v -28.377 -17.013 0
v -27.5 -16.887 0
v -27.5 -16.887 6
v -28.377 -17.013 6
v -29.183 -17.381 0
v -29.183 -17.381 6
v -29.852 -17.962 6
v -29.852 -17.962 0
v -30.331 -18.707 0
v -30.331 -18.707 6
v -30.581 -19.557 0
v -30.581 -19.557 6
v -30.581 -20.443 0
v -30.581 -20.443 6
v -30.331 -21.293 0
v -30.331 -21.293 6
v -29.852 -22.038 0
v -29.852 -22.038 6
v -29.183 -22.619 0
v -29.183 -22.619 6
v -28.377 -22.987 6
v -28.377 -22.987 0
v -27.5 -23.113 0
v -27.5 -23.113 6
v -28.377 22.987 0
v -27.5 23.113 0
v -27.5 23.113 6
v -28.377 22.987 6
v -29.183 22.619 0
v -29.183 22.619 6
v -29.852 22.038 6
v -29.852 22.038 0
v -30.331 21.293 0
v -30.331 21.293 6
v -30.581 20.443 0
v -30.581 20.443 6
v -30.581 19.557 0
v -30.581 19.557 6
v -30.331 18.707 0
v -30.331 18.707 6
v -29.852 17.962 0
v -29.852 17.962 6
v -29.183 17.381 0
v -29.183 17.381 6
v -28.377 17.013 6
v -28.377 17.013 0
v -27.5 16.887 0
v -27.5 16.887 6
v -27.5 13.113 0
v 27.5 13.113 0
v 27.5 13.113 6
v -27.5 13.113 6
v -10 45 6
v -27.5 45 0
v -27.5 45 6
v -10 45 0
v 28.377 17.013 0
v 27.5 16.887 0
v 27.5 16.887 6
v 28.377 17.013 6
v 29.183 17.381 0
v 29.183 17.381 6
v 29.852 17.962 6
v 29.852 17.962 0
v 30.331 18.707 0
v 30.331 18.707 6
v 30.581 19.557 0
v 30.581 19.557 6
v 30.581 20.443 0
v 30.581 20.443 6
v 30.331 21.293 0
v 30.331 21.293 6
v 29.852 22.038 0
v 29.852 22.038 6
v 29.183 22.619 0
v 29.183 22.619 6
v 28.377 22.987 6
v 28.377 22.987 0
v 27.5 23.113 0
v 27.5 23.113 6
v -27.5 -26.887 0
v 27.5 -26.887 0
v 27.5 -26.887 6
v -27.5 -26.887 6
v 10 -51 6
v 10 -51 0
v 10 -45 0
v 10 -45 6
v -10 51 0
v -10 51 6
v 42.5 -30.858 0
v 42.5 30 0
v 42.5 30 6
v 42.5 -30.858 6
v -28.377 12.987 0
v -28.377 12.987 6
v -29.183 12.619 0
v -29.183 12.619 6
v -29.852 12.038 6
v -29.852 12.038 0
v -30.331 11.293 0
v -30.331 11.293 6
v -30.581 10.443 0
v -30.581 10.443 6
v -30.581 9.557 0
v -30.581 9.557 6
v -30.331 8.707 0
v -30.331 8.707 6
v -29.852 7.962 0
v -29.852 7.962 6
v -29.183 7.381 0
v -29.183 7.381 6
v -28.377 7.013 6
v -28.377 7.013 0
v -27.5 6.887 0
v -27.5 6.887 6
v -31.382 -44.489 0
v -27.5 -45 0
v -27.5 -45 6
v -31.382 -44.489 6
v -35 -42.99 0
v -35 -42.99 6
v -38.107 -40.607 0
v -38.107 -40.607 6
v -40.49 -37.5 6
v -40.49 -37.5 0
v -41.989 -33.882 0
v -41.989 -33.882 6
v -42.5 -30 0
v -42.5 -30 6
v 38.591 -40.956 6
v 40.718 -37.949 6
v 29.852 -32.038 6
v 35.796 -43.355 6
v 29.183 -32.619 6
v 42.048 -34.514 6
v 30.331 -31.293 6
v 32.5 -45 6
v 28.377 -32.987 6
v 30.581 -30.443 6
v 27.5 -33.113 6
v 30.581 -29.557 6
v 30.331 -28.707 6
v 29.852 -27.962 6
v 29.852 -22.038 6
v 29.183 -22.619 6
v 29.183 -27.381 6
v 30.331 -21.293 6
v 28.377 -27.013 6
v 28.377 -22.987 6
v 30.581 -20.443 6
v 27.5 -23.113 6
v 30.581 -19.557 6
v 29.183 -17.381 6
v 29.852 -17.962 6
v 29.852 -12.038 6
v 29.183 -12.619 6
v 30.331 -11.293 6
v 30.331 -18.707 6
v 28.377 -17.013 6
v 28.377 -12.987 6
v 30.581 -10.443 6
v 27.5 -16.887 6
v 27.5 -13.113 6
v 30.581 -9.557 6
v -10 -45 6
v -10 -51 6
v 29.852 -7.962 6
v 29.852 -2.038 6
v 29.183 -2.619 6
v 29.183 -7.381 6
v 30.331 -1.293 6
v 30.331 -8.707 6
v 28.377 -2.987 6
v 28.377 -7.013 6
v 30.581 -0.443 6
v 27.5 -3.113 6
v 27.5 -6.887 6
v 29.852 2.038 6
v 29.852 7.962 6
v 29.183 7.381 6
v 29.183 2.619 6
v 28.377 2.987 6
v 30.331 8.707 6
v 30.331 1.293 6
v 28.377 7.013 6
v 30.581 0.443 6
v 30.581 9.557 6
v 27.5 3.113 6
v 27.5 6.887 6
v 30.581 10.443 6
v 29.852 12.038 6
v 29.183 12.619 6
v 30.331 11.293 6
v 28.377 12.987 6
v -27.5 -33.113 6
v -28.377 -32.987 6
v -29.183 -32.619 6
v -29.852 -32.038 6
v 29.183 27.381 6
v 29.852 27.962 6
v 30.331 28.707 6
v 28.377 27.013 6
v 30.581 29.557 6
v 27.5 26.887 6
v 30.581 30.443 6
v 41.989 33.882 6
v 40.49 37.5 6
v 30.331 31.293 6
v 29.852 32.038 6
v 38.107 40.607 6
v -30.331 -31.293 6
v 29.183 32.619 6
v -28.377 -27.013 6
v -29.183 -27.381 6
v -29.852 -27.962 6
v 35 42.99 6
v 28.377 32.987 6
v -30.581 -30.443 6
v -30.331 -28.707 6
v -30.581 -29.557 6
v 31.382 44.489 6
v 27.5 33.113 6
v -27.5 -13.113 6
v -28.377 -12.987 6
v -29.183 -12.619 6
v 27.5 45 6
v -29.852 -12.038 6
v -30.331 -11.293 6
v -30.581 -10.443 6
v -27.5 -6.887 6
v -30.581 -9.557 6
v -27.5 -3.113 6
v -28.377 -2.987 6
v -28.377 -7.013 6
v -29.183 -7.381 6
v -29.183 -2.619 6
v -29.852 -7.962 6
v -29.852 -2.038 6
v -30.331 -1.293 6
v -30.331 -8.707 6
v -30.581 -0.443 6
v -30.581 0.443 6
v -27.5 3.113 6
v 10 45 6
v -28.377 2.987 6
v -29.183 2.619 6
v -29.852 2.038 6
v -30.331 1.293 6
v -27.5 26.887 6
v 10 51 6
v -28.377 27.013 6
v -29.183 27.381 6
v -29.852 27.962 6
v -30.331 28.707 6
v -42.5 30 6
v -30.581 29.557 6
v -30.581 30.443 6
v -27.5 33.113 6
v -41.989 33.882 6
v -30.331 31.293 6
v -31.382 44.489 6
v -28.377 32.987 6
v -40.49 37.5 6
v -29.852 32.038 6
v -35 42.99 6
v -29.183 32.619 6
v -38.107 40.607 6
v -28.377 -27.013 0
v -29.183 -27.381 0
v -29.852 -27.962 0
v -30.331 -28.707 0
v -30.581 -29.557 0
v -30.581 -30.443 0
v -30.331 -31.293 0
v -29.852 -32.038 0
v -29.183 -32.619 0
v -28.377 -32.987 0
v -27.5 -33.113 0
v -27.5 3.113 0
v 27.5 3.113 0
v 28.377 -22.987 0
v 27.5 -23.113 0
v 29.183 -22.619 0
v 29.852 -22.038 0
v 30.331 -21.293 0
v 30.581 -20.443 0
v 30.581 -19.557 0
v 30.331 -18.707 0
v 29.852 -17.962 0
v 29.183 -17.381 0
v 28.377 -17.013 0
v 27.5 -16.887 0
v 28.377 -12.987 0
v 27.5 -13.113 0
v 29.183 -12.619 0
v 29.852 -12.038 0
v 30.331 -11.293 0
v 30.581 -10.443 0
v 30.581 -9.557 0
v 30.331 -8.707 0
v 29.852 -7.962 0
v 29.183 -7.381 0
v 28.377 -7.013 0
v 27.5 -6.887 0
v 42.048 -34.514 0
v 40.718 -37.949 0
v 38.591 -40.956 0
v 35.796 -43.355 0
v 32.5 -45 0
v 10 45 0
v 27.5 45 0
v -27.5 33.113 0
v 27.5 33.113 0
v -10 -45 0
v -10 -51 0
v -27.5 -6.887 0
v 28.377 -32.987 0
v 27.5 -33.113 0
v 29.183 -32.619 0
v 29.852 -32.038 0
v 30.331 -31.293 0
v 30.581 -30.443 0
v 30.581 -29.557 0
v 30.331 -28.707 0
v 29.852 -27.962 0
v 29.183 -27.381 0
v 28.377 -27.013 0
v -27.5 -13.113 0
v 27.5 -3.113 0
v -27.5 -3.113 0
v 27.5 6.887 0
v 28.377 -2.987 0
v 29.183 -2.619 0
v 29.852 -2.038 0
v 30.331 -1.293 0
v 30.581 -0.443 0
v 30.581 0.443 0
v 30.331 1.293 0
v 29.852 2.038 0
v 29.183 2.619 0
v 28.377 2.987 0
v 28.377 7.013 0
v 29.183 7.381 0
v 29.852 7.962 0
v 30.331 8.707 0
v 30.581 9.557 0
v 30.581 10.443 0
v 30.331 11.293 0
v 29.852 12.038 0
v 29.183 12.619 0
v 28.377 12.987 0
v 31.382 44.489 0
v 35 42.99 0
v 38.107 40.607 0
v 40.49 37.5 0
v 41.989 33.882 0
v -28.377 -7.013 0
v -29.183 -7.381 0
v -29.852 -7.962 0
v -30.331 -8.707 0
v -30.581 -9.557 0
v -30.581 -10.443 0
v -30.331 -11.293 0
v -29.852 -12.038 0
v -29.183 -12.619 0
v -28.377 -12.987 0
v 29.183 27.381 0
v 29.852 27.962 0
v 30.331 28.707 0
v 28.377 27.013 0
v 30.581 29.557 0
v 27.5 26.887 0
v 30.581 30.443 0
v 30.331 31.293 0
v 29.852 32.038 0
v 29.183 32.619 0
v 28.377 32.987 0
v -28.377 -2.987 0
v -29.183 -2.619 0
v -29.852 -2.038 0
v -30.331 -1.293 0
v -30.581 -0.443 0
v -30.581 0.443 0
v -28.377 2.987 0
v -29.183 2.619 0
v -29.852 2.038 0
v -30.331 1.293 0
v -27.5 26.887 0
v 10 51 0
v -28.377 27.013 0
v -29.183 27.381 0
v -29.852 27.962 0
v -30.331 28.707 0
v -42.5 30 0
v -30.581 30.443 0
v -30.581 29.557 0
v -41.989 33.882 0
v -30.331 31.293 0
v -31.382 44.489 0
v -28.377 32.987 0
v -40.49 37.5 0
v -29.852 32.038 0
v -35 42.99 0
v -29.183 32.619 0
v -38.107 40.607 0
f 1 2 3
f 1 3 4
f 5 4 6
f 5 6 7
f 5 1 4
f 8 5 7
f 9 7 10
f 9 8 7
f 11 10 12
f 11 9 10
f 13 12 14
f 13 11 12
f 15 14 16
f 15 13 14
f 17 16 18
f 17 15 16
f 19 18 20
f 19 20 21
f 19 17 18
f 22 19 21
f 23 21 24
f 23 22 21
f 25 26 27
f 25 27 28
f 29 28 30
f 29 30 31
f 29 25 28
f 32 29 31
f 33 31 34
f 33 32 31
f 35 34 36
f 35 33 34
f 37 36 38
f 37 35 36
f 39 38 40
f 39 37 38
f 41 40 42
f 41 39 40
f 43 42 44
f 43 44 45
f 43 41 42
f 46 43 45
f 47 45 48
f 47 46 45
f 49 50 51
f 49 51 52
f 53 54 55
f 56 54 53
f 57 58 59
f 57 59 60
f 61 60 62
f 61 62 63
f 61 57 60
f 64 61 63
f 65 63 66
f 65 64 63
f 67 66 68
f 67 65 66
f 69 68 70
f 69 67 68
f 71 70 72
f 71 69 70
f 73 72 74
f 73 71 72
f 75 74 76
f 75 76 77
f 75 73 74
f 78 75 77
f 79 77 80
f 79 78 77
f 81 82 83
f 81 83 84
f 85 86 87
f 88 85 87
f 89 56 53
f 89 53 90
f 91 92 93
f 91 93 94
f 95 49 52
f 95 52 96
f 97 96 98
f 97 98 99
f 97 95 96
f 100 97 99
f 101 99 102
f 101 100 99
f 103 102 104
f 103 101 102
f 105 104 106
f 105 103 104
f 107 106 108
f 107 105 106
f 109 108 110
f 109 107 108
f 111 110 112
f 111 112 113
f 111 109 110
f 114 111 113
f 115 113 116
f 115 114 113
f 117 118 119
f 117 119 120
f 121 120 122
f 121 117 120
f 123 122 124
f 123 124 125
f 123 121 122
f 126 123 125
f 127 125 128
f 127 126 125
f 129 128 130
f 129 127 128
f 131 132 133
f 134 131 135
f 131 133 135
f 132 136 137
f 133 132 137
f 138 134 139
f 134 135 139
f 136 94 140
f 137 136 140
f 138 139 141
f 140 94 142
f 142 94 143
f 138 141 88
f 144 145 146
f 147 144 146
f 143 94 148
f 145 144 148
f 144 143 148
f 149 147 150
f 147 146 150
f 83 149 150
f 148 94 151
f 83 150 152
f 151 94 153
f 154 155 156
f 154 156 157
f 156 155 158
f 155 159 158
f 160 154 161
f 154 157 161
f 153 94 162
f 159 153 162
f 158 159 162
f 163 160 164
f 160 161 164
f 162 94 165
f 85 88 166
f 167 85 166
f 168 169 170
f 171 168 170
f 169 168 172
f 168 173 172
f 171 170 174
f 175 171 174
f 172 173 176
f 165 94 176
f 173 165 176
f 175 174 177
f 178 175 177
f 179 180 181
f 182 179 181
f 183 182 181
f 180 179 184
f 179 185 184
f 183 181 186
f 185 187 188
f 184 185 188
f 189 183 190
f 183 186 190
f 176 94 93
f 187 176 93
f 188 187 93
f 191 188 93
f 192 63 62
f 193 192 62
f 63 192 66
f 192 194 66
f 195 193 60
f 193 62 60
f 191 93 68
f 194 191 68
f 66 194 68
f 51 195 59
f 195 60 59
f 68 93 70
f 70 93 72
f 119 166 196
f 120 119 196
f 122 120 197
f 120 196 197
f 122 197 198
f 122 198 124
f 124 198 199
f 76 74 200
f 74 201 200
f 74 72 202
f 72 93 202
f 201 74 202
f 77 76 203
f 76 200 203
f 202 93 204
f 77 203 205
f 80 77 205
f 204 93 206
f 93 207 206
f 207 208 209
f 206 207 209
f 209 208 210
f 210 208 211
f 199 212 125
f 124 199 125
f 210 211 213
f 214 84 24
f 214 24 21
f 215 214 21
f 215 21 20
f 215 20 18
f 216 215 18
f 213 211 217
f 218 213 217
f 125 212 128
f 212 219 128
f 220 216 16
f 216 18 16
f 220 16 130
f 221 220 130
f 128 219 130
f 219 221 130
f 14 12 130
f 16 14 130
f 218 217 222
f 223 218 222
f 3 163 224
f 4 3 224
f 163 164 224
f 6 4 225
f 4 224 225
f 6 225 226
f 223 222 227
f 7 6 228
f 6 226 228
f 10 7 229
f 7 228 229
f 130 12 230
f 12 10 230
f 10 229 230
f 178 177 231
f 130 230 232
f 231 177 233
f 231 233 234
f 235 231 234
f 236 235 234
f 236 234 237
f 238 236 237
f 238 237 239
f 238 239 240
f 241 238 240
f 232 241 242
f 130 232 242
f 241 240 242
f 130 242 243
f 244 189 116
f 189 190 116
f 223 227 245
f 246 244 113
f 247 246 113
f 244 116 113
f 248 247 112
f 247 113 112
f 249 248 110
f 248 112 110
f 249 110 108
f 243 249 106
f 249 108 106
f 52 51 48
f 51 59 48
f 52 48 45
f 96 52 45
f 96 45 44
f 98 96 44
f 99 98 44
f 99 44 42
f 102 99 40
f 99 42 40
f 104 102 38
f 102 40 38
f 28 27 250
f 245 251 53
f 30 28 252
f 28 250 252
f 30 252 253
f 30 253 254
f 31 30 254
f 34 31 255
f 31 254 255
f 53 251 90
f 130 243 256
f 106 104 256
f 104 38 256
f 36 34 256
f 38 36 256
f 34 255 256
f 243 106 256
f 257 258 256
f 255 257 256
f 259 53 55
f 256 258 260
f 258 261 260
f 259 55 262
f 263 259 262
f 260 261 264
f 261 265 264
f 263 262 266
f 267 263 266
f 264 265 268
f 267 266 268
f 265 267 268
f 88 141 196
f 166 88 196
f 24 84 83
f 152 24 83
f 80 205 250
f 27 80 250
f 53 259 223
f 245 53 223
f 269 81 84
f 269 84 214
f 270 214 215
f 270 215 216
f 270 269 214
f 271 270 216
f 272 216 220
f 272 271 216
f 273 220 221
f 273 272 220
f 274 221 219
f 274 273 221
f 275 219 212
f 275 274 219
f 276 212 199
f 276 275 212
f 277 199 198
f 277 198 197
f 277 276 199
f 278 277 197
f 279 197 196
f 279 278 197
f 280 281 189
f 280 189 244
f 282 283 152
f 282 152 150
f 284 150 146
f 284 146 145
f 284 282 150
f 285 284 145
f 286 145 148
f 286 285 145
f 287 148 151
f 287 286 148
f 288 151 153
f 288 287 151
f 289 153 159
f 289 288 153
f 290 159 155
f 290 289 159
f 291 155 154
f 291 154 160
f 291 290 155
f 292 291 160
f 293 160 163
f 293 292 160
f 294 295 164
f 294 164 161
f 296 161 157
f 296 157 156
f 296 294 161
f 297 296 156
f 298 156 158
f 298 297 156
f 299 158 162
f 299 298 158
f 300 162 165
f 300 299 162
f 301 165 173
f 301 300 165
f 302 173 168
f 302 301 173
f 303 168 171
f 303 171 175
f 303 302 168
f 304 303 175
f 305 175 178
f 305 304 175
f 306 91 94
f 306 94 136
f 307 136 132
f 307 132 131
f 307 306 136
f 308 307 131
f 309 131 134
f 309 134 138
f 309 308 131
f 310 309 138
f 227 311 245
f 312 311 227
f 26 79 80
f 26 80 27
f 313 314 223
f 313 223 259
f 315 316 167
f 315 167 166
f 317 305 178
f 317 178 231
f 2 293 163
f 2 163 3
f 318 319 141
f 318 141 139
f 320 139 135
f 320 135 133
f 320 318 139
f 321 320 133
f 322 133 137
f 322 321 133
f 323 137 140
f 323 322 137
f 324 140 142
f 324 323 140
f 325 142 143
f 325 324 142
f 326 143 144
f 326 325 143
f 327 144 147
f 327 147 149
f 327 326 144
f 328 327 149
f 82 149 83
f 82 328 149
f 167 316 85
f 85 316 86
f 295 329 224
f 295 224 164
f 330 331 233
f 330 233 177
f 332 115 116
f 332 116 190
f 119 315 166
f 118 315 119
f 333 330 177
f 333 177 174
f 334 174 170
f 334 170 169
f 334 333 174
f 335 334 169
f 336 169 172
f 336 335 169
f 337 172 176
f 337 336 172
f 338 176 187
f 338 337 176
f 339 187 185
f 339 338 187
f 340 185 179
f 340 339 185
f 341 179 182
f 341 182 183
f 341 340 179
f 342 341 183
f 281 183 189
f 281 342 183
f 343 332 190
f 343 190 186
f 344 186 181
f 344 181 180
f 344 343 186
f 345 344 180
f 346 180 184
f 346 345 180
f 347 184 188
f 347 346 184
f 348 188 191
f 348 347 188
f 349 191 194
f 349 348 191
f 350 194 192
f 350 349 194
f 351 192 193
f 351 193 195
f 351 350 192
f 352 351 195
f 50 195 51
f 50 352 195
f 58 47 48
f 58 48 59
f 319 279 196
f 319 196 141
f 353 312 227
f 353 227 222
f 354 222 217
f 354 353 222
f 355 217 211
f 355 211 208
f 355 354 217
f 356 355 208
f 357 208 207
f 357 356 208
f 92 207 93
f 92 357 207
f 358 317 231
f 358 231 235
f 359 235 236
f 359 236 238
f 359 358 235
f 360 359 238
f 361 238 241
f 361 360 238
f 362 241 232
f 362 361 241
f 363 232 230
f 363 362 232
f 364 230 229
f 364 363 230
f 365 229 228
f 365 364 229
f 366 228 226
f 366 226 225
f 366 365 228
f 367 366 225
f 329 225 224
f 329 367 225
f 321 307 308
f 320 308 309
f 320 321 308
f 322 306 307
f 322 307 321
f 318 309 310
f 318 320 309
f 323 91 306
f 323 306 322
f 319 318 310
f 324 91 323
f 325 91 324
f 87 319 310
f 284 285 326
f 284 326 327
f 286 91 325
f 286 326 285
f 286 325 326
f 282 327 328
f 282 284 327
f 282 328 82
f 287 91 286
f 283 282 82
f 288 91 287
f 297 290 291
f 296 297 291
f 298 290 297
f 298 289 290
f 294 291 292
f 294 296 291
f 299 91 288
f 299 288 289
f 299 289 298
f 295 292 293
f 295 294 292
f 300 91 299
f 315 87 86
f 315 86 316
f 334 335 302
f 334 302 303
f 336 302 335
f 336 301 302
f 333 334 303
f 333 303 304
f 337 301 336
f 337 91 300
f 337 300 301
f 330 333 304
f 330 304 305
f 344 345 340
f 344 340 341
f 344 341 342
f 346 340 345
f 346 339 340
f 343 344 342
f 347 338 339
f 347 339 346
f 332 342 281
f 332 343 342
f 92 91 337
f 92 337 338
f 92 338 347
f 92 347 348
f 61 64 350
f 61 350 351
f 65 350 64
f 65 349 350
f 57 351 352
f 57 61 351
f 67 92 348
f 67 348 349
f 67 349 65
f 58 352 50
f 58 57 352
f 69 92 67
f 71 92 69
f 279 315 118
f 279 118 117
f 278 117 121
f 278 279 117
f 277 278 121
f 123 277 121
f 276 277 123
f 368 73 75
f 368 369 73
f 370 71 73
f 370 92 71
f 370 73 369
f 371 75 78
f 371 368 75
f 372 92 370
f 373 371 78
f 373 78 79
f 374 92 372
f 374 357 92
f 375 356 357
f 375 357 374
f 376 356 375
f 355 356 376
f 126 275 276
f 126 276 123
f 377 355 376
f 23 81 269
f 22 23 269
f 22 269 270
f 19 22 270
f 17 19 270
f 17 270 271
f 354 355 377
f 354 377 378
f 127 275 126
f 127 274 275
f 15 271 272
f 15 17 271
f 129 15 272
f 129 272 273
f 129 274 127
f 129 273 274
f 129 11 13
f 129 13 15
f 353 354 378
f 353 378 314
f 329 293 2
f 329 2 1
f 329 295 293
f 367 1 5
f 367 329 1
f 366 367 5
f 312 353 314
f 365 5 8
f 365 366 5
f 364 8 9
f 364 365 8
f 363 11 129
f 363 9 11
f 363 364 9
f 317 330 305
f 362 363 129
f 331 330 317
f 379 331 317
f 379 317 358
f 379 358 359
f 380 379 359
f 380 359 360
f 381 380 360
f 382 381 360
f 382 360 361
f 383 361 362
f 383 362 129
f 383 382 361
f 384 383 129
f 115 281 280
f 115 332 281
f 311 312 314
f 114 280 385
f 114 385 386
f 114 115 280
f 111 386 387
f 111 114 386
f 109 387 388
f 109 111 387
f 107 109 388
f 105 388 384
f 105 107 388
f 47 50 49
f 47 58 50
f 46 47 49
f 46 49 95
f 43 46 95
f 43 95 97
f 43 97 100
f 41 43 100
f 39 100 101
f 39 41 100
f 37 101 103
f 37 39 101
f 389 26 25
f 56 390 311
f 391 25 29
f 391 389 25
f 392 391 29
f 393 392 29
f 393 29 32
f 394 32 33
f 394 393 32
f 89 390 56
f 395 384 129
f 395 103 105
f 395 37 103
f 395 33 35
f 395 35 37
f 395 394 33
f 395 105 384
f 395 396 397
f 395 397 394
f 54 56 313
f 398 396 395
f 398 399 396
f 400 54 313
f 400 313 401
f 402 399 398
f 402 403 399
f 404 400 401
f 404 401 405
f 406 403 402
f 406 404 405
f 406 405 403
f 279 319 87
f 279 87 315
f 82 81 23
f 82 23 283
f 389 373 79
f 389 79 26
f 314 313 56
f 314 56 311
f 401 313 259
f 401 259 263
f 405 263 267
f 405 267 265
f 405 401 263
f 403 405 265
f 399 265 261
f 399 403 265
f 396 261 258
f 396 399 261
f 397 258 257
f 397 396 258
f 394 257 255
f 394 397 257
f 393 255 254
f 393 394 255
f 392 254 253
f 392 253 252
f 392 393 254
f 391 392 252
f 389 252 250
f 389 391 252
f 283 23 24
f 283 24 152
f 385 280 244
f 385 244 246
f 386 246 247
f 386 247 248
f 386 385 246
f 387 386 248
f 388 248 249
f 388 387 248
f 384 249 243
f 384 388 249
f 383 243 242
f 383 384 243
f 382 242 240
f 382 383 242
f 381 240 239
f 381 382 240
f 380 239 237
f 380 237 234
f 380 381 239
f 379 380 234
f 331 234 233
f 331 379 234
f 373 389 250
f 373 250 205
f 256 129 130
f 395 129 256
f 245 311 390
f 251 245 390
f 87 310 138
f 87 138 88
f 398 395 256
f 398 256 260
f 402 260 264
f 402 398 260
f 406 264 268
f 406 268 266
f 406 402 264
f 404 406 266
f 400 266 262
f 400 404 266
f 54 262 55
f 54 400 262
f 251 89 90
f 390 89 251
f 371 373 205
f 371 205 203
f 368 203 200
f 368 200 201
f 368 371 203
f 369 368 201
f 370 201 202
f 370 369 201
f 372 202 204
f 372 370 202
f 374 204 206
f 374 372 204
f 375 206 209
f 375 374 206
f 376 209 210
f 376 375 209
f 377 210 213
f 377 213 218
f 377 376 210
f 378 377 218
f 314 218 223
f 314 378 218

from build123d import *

# Parameters (mm, degrees)
SKETCH1_W           = 20
SKETCH1_H           = 6
BOSS_EXTRUDE1_DEPTH = 6


with BuildPart() as part:
    # Sketch1 → Boss-Extrude1 (new body)
    # profile 1 of 3: a face of its own
    with BuildSketch(Plane.XY):
        with BuildLine():
            ThreePointArc((27.5, 45), (38.106601718, 40.606601718), (42.5, 30))
            Line((42.5, 30), (42.5, -30.857864376))
            ThreePointArc((42.5, -30.857864376), (39.747448714, -39.518118414), (32.5, -45))
            Line((32.5, -45), (-27.5, -45))
            ThreePointArc((-27.5, -45), (-38.106601718, -40.606601718), (-42.5, -30))
            Line((-42.5, -30), (-42.5, 30))
            ThreePointArc((-42.5, 30), (-38.106601718, 40.606601718), (-27.5, 45))
            Line((-27.5, 45), (27.5, 45))
        make_face()
        with BuildLine():
            ThreePointArc((27.5, -33.112673684), (30.612673684, -30), (27.5, -26.887326316))
            Line((27.5, -26.887326316), (-27.5, -26.887326316))
            ThreePointArc((-27.5, -26.887326316), (-30.612673684, -30), (-27.5, -33.112673684))
            Line((-27.5, -33.112673684), (27.5, -33.112673684))
        make_face(mode=Mode.SUBTRACT)
        with BuildLine():
            ThreePointArc((27.5, -23.112673684), (30.612673684, -20), (27.5, -16.887326316))
            Line((27.5, -16.887326316), (-27.5, -16.887326316))
            ThreePointArc((-27.5, -16.887326316), (-30.612673684, -20), (-27.5, -23.112673684))
            Line((-27.5, -23.112673684), (27.5, -23.112673684))
        make_face(mode=Mode.SUBTRACT)
        with BuildLine():
            ThreePointArc((27.5, -13.112673684), (30.612673684, -10), (27.5, -6.887326316))
            Line((27.5, -6.887326316), (-27.5, -6.887326316))
            ThreePointArc((-27.5, -6.887326316), (-30.612673684, -10), (-27.5, -13.112673684))
            Line((-27.5, -13.112673684), (27.5, -13.112673684))
        make_face(mode=Mode.SUBTRACT)
        with BuildLine():
            ThreePointArc((27.5, -3.112673684), (30.612673684, 0), (27.5, 3.112673684))
            Line((27.5, 3.112673684), (-27.5, 3.112673684))
            ThreePointArc((-27.5, 3.112673684), (-30.612673684, 0), (-27.5, -3.112673684))
            Line((-27.5, -3.112673684), (27.5, -3.112673684))
        make_face(mode=Mode.SUBTRACT)
        with BuildLine():
            ThreePointArc((27.5, 6.887326316), (30.612673684, 10), (27.5, 13.112673684))
            Line((27.5, 13.112673684), (-27.5, 13.112673684))
            ThreePointArc((-27.5, 13.112673684), (-30.612673684, 10), (-27.5, 6.887326316))
            Line((-27.5, 6.887326316), (27.5, 6.887326316))
        make_face(mode=Mode.SUBTRACT)
        with BuildLine():
            ThreePointArc((27.5, 16.887326316), (30.612673684, 20), (27.5, 23.112673684))
            Line((27.5, 23.112673684), (-27.5, 23.112673684))
            ThreePointArc((-27.5, 23.112673684), (-30.612673684, 20), (-27.5, 16.887326316))
            Line((-27.5, 16.887326316), (27.5, 16.887326316))
        make_face(mode=Mode.SUBTRACT)
        with BuildLine():
            ThreePointArc((27.5, 26.887326316), (30.612673684, 30), (27.5, 33.112673684))
            Line((27.5, 33.112673684), (-27.5, 33.112673684))
            ThreePointArc((-27.5, 33.112673684), (-30.612673684, 30), (-27.5, 26.887326316))
            Line((-27.5, 26.887326316), (27.5, 26.887326316))
        make_face(mode=Mode.SUBTRACT)
    # profile 2 of 3: a face of its own
    with BuildSketch(Plane.XY):
        with Locations((0, 48)):
            Rectangle(SKETCH1_W, SKETCH1_H)
    # profile 3 of 3: a face of its own
    with BuildSketch(Plane.XY):
        with Locations((0, -48)):
            Rectangle(SKETCH1_W, SKETCH1_H)
    extrude(amount=BOSS_EXTRUDE1_DEPTH)


solid = part.part
